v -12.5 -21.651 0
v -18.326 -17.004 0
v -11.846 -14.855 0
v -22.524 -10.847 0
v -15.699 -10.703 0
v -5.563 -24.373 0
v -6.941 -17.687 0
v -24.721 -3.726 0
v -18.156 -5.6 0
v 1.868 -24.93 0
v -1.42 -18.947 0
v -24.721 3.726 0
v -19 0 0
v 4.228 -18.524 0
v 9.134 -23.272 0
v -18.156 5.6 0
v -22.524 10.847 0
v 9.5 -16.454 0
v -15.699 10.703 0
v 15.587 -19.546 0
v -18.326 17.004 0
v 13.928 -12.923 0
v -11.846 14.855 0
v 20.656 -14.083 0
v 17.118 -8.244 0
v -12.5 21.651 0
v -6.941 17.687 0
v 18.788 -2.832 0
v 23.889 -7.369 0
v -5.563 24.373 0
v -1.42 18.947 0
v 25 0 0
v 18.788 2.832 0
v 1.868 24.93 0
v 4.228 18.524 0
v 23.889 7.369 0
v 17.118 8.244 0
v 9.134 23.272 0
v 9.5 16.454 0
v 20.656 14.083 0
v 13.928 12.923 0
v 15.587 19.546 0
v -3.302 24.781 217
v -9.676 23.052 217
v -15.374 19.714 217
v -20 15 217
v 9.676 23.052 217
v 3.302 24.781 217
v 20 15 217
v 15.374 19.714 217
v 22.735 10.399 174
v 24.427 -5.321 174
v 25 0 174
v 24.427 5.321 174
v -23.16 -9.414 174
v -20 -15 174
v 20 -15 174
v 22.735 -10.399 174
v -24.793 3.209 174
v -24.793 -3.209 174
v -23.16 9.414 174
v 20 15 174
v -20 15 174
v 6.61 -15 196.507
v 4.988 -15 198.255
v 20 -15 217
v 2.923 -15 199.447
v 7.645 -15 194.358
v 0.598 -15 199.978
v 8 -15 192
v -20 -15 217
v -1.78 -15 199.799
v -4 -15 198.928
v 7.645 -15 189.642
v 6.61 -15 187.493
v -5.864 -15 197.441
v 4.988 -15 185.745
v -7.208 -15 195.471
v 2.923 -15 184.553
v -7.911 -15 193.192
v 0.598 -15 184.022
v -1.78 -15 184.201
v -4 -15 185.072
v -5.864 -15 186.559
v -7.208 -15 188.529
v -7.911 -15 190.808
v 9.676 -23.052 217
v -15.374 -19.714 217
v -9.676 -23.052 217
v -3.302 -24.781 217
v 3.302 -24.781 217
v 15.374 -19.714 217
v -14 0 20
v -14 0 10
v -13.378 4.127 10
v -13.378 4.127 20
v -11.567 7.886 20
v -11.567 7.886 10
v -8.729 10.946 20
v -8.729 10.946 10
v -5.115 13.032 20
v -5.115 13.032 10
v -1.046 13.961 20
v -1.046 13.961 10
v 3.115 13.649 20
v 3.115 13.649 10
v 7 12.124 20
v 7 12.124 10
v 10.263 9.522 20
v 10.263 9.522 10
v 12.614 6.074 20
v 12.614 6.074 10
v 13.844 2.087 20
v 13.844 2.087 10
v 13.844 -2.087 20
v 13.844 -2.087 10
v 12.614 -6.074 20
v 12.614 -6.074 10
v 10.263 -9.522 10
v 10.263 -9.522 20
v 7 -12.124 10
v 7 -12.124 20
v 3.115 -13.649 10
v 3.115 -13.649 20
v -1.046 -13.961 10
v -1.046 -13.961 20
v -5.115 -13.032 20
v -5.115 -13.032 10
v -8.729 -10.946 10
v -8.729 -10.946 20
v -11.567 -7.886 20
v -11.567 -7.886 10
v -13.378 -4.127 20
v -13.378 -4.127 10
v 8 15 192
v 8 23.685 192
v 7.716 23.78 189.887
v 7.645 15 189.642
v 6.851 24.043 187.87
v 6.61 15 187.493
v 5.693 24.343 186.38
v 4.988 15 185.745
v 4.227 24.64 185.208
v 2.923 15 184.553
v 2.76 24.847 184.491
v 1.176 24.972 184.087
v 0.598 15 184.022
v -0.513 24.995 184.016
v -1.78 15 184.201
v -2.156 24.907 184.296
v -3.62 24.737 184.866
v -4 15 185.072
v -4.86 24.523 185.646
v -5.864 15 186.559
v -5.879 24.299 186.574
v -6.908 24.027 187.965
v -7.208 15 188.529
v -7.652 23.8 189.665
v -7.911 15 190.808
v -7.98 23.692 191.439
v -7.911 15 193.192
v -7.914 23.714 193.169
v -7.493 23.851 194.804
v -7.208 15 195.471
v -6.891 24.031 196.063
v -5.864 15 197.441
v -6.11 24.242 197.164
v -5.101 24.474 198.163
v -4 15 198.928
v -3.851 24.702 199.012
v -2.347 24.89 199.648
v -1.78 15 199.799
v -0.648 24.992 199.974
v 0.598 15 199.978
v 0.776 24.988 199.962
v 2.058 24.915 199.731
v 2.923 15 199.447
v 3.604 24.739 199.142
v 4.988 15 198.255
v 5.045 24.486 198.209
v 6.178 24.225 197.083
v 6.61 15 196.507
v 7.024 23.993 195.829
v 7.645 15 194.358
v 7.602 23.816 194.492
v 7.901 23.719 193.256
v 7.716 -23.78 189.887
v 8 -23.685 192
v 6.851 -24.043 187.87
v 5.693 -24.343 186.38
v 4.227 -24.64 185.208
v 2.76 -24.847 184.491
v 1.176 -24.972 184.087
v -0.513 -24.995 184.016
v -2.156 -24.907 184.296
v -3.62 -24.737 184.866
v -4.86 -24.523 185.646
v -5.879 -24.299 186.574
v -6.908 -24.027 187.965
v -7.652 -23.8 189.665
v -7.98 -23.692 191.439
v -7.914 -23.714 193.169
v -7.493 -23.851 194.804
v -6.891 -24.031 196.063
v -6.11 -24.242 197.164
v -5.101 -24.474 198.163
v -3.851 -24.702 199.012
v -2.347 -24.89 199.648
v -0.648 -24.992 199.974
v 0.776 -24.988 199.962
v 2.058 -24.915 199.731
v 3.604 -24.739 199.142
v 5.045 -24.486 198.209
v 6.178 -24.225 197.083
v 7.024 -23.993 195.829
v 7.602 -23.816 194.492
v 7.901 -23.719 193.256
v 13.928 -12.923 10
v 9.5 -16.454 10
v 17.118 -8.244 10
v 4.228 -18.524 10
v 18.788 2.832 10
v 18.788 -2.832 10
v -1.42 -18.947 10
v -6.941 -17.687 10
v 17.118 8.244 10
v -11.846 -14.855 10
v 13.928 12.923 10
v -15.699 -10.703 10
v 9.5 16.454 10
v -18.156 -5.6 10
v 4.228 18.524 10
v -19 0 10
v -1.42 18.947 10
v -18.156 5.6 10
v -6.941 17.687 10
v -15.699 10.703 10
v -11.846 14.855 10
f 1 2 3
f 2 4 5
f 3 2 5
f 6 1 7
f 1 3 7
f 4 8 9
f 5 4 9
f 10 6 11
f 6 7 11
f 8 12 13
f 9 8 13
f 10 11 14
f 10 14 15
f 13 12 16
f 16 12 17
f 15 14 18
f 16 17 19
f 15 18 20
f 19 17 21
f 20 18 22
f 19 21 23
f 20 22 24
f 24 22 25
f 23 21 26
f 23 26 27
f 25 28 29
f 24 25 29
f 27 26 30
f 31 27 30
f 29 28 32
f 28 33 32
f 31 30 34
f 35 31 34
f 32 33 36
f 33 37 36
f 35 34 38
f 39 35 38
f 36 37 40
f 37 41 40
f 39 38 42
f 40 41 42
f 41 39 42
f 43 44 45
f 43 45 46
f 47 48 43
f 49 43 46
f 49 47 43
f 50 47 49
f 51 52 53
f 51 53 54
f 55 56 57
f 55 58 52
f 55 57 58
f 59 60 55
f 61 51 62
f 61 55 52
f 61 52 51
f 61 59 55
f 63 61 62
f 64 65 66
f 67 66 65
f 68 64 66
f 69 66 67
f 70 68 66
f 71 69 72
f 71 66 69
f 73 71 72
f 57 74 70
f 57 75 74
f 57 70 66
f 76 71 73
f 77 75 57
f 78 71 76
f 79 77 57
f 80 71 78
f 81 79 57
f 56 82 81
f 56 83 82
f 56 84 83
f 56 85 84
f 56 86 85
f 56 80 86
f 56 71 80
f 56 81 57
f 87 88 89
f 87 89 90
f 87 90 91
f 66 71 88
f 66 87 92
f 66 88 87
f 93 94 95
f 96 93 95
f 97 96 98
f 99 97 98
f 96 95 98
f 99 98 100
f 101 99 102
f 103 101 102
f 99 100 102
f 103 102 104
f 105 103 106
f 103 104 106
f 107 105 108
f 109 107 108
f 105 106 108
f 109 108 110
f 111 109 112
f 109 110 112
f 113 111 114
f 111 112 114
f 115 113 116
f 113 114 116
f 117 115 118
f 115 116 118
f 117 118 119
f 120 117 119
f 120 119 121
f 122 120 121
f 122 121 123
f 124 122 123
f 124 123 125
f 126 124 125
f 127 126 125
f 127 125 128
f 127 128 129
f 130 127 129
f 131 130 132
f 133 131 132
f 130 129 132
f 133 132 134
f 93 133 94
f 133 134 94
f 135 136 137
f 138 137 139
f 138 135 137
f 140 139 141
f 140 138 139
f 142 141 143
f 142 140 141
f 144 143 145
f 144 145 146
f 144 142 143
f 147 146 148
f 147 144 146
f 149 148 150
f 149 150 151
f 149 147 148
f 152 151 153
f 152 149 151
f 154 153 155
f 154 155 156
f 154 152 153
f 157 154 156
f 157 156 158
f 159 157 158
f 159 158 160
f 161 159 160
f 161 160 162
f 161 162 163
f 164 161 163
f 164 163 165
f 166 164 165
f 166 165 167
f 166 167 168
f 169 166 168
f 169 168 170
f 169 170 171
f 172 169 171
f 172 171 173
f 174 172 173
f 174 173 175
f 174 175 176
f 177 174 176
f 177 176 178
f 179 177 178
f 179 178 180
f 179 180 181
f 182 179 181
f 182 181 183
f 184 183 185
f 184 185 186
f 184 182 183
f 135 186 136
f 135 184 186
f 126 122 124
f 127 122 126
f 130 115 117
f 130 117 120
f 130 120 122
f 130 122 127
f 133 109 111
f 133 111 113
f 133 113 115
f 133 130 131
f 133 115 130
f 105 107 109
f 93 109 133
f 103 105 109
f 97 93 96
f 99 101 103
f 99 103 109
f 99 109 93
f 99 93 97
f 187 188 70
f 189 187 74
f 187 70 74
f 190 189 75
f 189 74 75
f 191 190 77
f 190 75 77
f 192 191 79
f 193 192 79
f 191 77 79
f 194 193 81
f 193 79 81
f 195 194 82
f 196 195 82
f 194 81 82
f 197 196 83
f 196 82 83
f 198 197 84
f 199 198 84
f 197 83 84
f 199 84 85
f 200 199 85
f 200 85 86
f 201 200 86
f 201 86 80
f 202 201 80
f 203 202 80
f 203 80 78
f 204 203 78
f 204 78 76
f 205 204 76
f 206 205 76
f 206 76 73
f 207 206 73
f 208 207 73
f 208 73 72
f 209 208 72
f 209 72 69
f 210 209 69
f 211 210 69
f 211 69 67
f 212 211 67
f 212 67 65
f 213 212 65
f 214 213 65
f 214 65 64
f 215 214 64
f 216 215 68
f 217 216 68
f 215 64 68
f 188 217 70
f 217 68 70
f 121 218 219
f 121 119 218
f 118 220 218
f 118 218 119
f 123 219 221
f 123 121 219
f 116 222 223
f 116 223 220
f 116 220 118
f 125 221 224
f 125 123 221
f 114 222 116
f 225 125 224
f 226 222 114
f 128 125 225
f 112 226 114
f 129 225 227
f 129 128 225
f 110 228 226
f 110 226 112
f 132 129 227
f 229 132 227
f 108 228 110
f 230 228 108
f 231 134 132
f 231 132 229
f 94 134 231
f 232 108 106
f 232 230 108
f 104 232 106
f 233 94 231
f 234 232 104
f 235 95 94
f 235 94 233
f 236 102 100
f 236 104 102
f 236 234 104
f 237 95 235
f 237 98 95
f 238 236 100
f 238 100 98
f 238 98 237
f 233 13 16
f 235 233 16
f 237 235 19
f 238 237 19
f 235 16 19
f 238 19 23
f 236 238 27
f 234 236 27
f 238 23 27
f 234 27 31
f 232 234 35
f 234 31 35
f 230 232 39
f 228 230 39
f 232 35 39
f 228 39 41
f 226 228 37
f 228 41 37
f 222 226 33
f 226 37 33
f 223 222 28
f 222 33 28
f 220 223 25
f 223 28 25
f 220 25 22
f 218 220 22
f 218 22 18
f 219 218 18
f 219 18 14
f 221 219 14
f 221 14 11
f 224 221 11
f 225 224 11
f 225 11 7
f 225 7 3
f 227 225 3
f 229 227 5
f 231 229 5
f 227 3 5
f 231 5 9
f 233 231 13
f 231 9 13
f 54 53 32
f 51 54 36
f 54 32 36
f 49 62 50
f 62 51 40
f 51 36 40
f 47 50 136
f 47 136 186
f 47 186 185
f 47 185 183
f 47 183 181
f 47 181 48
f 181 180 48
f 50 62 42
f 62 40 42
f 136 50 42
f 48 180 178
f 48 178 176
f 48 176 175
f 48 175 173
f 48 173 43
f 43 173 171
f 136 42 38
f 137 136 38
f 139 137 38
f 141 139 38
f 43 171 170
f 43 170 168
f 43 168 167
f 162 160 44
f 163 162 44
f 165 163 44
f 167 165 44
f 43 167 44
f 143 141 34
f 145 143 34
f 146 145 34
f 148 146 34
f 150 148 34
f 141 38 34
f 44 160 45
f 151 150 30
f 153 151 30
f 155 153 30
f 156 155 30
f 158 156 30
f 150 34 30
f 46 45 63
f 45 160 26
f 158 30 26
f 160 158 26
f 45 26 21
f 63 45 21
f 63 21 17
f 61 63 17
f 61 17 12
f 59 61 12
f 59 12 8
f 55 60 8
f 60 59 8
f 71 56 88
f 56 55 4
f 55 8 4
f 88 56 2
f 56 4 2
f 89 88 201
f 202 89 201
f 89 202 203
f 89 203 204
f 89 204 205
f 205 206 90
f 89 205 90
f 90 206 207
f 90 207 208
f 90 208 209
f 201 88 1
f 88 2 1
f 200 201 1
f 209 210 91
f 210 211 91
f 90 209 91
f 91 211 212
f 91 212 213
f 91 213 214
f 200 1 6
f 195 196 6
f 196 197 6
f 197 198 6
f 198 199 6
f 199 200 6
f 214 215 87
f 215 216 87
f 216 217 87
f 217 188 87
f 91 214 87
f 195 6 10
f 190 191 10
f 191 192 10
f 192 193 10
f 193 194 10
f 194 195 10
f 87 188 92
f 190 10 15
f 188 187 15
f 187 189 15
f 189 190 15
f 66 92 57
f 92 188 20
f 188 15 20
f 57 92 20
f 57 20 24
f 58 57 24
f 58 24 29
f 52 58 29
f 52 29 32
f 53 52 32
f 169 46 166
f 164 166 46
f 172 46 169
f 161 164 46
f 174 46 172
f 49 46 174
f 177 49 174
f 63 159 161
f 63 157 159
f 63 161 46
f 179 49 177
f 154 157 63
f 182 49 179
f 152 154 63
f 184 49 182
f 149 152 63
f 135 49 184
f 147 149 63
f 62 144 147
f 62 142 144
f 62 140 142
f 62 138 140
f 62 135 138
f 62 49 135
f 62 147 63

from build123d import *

# Parameters (mm, degrees)
SKETCH1_R               = 25
BOSS_EXTRUDE1_DEPTH     = 217
SKETCH2_R               = 19
CUT_EXTRUDE1_DEPTH      = 10
SKETCH3_R               = 14
CUT_EXTRUDE2_DEPTH      = 10
SKETCH4_W               = 43
SKETCH4_H               = 30
CUT_EXTRUDE3_DEPTH      = 26
CUT_EXTRUDE3_DEPTH_BACK = 26
SKETCH5_R               = 8
CUT_EXTRUDE4_DEPTH      = 26
CUT_EXTRUDE4_DEPTH_BACK = 26


with BuildPart() as part:
    # Sketch1 → Boss-Extrude1 (new body)
    with BuildSketch(Plane.XY):
        Circle(SKETCH1_R)
    extrude(amount=BOSS_EXTRUDE1_DEPTH)

    # Sketch2 → Cut-Extrude1 (cut)
    with BuildSketch(Plane(origin=(0, 0, 0), x_dir=(-1, 0, 0), z_dir=(0, 0, -1))):
        Circle(SKETCH2_R)
    extrude(amount=-CUT_EXTRUDE1_DEPTH, mode=Mode.SUBTRACT)

    # Sketch3 → Cut-Extrude2 (cut)
    with BuildSketch(Plane(origin=(0, 0, 10), x_dir=(-1, 0, 0), z_dir=(0, 0, -1))):
        Circle(SKETCH3_R)
    extrude(amount=-CUT_EXTRUDE2_DEPTH, mode=Mode.SUBTRACT)

    # Sketch4 → Cut-Extrude3 (cut, two sides)
    with BuildSketch(Plane(origin=(0, 0, 0), x_dir=(0, 0, -1), z_dir=(1, 0, 0))) as cut_extrude3_sk:
        with Locations((-195.5, 0)):
            Rectangle(SKETCH4_W, SKETCH4_H)
    extrude(amount=CUT_EXTRUDE3_DEPTH, mode=Mode.SUBTRACT)
    extrude(cut_extrude3_sk.sketch, amount=-CUT_EXTRUDE3_DEPTH_BACK, mode=Mode.SUBTRACT)

    # Sketch5 → Cut-Extrude4 (cut, two sides)
    with BuildSketch(Plane(origin=(0, 0, 0), x_dir=(1, 0, 0), z_dir=(0, 1, 0))) as cut_extrude4_sk:
        with Locations((0, -192)):
            Circle(SKETCH5_R)
    extrude(amount=CUT_EXTRUDE4_DEPTH, mode=Mode.SUBTRACT)
    extrude(cut_extrude4_sk.sketch, amount=-CUT_EXTRUDE4_DEPTH_BACK, mode=Mode.SUBTRACT)


solid = part.part
